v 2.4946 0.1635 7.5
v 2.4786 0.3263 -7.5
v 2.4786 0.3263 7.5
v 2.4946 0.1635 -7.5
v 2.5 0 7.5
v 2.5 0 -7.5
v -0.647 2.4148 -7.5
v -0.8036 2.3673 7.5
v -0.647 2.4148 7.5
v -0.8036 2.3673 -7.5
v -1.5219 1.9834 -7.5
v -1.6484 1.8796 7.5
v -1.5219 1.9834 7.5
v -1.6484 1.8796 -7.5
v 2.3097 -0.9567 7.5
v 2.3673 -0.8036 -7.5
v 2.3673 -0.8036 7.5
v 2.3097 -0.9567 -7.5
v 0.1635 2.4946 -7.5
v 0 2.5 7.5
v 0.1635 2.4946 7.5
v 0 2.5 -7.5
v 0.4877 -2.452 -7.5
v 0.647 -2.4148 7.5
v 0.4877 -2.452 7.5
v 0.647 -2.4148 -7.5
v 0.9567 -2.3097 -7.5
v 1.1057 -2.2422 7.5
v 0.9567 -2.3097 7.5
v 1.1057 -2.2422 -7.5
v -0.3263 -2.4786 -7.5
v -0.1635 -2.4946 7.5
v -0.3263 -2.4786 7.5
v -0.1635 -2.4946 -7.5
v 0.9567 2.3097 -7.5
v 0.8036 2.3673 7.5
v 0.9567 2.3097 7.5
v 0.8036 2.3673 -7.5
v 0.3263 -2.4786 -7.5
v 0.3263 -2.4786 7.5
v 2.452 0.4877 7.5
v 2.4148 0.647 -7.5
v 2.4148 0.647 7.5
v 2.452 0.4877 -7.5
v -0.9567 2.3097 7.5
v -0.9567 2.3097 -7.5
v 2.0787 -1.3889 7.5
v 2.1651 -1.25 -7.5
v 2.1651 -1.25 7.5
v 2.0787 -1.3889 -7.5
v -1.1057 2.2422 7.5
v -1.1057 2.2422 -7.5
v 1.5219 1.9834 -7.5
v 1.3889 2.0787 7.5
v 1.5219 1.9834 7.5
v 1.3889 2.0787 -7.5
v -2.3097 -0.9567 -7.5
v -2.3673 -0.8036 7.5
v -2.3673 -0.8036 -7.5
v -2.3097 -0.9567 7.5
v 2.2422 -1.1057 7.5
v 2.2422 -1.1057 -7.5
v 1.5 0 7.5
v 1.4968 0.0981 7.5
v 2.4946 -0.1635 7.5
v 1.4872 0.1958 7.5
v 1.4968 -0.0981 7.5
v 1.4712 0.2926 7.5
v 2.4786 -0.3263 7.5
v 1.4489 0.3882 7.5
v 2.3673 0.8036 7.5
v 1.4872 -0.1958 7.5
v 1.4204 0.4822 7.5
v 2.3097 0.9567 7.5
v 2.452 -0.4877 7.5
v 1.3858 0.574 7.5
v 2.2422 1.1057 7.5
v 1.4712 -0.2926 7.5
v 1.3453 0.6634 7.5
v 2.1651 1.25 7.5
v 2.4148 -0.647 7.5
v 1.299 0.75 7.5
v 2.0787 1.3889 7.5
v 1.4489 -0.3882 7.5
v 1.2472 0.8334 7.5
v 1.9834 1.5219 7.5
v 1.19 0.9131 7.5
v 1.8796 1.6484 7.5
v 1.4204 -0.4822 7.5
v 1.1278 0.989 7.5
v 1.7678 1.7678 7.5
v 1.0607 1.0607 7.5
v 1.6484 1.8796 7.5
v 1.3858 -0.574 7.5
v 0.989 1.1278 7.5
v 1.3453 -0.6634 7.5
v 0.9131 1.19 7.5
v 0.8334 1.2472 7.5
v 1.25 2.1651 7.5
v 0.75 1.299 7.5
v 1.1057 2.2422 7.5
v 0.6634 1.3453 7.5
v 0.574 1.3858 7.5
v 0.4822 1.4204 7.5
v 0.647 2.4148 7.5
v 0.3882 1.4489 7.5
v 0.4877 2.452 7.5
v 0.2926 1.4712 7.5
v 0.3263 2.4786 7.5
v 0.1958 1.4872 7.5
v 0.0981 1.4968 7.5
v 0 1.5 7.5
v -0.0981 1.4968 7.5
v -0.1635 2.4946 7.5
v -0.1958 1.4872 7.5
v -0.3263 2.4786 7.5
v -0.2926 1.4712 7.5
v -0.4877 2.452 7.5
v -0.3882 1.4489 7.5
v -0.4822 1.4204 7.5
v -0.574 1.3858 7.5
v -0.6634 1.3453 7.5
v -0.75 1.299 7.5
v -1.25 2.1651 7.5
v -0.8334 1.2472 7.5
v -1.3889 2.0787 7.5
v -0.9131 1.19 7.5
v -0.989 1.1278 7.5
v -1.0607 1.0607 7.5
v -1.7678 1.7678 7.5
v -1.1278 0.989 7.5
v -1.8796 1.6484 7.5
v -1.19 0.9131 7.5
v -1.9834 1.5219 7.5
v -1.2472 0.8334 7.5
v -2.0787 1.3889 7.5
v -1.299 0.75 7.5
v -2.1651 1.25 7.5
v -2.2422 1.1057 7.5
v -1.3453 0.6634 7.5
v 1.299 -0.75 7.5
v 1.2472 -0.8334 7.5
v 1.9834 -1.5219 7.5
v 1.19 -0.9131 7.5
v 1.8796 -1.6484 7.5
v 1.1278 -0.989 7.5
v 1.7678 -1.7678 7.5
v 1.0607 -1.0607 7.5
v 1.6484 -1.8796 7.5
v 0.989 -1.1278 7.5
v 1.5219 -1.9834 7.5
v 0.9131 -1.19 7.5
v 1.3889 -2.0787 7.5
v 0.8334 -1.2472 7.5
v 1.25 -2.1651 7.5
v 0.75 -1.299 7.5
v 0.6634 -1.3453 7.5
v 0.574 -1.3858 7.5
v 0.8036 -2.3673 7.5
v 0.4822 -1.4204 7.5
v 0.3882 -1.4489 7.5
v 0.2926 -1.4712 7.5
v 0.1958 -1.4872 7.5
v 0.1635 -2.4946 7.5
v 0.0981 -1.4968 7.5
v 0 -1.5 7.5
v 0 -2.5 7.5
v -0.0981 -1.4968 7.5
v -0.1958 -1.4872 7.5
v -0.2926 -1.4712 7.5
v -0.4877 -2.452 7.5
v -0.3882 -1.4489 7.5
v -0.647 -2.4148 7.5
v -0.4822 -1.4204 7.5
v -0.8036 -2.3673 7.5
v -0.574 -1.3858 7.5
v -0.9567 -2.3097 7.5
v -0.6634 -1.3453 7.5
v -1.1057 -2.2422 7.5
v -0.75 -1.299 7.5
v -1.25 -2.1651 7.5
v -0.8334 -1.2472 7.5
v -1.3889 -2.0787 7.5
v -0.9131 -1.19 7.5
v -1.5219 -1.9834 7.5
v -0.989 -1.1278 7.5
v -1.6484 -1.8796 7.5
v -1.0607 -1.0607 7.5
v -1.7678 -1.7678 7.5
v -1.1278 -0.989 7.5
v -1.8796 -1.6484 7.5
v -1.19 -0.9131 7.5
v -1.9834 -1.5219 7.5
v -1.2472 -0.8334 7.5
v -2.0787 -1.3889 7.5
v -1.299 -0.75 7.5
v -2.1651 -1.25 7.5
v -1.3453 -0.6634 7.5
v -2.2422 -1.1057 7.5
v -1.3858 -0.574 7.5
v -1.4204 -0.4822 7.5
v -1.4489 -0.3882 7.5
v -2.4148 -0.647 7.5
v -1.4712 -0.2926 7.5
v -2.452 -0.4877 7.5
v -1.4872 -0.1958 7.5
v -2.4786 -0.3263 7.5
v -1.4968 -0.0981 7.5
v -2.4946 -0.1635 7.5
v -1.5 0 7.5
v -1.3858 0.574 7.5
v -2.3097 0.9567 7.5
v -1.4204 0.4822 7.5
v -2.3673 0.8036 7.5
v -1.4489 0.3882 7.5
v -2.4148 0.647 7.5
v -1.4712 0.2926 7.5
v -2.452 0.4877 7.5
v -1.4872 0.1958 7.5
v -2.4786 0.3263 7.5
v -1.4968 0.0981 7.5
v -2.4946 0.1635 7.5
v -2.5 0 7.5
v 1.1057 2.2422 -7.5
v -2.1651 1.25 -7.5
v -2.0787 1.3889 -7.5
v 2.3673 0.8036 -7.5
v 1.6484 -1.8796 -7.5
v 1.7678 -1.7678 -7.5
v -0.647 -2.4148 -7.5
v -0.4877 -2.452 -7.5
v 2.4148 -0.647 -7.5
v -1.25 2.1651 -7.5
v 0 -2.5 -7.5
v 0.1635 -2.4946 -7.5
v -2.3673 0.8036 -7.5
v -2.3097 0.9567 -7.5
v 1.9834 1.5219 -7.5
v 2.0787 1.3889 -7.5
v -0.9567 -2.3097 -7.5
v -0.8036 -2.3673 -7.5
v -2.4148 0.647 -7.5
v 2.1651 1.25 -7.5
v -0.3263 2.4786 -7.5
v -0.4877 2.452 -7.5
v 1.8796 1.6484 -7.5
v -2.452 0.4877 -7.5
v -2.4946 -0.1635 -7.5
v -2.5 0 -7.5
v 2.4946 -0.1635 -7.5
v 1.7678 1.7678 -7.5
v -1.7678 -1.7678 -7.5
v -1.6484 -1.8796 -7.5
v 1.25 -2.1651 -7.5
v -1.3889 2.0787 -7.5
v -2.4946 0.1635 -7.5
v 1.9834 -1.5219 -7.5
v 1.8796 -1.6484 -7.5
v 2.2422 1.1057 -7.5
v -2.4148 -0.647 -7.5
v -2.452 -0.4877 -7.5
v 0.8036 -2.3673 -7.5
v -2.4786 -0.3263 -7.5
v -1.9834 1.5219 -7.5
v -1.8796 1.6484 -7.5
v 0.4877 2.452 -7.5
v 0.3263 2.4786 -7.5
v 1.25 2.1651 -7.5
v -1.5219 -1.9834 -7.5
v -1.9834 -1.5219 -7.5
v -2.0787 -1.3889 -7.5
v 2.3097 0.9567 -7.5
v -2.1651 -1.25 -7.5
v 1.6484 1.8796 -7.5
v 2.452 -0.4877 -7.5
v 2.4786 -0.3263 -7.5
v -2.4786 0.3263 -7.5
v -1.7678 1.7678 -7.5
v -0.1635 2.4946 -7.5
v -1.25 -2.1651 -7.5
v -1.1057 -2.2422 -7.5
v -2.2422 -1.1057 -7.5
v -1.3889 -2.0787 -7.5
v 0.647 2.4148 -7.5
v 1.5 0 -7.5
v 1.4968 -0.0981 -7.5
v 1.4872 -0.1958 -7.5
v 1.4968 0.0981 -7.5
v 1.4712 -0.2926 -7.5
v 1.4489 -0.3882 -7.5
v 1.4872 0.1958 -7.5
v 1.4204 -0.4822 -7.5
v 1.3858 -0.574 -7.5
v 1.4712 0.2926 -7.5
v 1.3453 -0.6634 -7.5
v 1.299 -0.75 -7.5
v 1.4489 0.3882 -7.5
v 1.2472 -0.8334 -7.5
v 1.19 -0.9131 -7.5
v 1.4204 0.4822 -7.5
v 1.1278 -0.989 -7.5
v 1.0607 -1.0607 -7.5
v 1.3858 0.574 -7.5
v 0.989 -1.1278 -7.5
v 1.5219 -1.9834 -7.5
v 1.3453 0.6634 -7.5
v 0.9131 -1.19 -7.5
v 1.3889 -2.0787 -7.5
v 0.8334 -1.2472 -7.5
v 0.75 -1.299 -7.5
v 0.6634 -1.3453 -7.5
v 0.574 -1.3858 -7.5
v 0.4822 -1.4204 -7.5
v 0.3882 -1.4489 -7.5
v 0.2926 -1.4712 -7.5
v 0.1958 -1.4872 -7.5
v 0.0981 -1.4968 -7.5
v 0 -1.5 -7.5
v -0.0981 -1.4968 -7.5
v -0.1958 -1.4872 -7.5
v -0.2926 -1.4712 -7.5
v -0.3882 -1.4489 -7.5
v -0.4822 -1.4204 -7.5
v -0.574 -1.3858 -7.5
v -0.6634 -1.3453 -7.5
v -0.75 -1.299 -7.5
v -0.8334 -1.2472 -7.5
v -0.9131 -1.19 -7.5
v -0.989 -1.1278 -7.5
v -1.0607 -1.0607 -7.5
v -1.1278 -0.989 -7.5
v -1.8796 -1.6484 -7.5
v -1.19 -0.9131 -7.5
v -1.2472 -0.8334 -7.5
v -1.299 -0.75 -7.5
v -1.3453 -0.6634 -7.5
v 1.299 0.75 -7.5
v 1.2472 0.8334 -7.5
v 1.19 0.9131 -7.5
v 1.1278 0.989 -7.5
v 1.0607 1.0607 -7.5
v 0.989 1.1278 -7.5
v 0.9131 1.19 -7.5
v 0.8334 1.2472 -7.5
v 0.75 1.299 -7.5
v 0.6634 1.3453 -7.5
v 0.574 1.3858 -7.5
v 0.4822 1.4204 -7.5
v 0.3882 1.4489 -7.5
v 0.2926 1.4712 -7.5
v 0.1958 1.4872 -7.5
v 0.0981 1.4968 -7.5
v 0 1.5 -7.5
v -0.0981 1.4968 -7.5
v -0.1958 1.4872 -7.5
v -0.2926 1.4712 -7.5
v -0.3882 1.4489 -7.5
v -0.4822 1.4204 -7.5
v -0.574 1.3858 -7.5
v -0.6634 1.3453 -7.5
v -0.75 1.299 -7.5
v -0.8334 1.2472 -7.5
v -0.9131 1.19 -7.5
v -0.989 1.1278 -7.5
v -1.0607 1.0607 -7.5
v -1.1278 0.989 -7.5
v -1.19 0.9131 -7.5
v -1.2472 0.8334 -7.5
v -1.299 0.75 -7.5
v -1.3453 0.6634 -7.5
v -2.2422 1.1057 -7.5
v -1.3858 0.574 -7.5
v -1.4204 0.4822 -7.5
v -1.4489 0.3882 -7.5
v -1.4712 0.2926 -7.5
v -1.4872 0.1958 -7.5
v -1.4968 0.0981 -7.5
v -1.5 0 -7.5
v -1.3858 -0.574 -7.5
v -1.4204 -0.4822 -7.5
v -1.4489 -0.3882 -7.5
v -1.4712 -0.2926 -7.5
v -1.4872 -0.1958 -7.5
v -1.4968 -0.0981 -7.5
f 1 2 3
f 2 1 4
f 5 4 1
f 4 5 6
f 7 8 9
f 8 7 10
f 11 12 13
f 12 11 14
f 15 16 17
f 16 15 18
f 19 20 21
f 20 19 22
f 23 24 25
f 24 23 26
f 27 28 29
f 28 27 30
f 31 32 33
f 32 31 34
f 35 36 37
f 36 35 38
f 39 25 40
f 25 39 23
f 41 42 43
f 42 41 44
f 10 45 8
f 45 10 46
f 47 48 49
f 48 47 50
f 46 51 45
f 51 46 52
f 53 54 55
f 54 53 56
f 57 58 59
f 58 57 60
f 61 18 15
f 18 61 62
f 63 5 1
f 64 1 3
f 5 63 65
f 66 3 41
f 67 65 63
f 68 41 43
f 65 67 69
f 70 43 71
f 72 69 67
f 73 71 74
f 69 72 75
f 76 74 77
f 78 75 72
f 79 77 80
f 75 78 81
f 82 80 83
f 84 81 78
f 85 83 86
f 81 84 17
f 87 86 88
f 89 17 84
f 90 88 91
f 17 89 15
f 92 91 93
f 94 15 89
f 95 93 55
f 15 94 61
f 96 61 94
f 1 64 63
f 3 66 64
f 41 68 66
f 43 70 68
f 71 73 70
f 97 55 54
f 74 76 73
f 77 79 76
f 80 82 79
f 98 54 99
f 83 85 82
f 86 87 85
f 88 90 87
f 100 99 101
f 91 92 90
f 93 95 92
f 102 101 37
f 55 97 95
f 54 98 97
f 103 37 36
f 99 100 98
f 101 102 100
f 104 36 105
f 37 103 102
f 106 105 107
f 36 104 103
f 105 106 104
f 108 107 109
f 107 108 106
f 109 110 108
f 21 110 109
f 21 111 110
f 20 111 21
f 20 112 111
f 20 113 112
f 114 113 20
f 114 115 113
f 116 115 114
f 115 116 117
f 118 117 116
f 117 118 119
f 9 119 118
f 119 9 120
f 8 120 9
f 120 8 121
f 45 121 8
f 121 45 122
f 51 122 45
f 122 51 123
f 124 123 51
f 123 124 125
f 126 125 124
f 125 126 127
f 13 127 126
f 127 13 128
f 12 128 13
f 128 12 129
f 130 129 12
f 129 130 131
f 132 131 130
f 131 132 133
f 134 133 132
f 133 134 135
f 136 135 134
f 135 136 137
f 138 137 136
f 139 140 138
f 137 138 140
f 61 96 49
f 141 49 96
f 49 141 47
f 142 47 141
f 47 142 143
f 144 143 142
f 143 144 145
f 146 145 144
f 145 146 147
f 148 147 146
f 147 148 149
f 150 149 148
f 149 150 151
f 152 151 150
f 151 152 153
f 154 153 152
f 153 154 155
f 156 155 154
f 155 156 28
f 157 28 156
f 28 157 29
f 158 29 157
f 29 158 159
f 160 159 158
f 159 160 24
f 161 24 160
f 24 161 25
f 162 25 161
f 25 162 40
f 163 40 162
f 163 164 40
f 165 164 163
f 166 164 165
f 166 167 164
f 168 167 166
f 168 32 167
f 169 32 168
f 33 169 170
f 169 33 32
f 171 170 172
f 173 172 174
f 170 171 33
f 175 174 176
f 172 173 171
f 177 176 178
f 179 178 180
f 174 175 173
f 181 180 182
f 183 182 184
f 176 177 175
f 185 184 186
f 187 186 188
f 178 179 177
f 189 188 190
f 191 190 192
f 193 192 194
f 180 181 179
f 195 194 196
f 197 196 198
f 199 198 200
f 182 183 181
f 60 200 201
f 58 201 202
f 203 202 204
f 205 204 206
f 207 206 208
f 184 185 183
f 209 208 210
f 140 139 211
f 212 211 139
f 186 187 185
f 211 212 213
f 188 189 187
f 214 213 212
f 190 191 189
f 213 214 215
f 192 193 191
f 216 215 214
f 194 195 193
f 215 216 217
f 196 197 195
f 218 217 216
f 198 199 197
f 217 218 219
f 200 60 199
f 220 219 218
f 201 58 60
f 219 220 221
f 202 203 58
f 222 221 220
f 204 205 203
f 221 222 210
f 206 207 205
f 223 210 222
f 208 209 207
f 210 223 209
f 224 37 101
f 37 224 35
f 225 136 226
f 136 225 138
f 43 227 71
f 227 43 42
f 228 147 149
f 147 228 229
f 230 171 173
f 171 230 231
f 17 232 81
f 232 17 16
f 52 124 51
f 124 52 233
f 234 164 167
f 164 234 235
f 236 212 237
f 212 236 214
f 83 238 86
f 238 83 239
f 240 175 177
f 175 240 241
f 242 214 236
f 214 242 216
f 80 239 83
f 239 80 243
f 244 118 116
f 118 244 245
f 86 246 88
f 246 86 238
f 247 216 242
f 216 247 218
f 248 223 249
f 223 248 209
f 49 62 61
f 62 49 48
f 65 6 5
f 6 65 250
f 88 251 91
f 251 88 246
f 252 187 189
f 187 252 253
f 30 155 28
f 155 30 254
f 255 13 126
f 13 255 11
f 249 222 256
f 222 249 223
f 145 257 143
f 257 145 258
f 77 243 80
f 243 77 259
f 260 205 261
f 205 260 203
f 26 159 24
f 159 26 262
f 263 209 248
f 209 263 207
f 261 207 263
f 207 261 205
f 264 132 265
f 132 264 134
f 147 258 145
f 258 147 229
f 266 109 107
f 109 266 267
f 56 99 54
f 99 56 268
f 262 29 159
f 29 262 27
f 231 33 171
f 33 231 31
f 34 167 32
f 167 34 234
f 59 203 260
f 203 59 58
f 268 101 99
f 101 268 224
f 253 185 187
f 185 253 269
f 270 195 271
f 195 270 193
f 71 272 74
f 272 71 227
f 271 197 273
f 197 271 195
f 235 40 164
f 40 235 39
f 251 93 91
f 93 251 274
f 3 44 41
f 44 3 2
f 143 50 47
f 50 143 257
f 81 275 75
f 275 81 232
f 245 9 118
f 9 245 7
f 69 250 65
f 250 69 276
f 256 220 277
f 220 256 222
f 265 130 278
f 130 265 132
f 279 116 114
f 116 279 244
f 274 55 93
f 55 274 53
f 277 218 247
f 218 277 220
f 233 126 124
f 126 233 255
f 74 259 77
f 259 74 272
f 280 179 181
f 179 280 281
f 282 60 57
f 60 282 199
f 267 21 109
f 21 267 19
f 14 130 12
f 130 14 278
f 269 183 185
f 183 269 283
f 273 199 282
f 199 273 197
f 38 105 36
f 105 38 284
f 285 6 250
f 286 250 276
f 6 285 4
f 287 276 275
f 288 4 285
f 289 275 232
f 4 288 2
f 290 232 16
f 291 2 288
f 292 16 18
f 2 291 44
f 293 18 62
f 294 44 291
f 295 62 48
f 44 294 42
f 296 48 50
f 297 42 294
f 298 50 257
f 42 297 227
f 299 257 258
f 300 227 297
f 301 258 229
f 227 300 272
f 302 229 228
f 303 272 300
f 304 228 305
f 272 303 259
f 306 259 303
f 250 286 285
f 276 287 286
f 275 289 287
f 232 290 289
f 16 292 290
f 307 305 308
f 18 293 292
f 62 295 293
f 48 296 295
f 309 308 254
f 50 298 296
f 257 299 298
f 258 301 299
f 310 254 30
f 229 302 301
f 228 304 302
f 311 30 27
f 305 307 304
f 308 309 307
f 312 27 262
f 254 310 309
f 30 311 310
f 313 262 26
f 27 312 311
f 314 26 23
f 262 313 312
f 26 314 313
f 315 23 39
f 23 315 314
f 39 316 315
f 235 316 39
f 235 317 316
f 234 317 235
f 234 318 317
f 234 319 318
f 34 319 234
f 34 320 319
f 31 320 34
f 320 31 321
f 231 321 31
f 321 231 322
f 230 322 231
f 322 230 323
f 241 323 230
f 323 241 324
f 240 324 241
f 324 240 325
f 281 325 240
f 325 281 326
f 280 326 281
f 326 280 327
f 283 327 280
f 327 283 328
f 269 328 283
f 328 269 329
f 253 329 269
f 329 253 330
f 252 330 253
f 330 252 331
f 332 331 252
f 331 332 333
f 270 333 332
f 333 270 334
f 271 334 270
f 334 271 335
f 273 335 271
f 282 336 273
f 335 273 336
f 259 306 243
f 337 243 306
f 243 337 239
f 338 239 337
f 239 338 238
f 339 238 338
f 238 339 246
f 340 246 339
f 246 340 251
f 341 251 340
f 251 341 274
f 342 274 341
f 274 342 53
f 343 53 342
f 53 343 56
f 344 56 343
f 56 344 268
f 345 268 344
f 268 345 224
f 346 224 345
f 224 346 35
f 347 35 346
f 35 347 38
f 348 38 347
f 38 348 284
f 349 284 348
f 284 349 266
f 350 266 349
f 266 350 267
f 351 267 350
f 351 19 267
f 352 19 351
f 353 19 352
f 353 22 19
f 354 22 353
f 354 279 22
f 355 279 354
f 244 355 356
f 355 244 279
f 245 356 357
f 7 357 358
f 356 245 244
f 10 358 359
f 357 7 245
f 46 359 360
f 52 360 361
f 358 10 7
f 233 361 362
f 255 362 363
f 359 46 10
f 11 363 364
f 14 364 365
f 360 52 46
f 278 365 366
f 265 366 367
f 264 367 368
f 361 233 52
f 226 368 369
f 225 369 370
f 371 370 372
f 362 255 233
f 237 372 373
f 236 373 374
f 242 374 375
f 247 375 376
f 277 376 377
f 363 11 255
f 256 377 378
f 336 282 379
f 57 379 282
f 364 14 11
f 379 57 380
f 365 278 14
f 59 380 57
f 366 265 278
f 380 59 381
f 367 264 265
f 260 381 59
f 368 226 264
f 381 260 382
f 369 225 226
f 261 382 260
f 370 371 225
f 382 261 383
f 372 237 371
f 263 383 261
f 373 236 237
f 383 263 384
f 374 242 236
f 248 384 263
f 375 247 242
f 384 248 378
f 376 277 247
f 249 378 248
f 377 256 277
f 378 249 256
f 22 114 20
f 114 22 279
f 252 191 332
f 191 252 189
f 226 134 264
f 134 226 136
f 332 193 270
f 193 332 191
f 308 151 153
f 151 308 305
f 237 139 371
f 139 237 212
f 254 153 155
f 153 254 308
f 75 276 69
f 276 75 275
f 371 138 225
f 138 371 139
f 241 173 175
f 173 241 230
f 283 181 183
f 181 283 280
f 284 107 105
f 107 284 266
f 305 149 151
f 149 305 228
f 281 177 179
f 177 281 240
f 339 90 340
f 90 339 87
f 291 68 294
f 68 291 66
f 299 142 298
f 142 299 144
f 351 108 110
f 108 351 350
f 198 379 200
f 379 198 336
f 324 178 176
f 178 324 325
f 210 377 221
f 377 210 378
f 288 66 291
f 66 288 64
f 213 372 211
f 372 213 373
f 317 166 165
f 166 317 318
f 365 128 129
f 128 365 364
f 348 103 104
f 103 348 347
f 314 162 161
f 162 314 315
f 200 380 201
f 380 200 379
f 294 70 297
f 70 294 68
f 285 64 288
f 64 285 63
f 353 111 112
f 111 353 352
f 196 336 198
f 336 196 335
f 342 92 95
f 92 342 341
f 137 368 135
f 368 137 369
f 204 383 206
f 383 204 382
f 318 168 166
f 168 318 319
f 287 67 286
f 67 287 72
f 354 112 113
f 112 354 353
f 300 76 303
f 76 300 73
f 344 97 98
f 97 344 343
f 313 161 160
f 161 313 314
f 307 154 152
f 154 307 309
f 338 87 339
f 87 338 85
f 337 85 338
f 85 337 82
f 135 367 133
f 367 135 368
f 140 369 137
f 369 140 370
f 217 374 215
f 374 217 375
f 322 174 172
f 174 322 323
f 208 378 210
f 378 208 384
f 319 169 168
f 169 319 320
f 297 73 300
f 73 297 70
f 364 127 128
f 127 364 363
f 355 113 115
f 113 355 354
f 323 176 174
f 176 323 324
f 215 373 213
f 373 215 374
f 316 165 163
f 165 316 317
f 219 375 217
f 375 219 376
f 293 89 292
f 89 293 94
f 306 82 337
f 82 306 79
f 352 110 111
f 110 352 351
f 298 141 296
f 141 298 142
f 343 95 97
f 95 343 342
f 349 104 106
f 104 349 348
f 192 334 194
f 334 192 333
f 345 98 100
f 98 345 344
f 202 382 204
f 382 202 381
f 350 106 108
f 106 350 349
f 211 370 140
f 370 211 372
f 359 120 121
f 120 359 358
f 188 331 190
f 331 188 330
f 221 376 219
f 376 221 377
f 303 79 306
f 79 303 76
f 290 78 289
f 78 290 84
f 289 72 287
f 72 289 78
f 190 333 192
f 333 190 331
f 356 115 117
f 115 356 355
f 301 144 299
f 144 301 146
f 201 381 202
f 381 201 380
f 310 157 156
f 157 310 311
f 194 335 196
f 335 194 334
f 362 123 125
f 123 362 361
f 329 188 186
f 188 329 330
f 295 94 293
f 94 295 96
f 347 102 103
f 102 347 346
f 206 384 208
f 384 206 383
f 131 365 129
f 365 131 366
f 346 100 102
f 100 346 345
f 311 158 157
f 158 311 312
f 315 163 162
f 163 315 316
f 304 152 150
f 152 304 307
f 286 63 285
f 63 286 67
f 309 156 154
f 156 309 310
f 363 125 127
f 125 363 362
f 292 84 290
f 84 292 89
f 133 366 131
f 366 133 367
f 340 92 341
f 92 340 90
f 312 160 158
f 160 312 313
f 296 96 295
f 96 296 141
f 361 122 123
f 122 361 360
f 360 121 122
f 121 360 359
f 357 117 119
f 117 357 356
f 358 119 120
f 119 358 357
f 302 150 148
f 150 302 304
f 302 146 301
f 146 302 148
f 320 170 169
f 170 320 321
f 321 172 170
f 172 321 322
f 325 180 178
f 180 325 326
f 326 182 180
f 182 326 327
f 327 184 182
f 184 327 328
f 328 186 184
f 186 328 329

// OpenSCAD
// Heatshrink sleeving (simple hollow tube segment) - single connected solid

// Parameters
length = 15;            //[8:30:1]  Tube length
center = 1;             //[0:1:1]   1=centered at origin, 0=sits on Z=0
forced_id = 0;          //[0:10:0.1] If >0, overrides nominal_id
nominal_id = 3;         //[1.5:6:0.1]
nominal_od = 5;         //[2.5:10:0.1]
id = 3;                 //[1.5:10:0.1] Inner diameter (used if forced_id==0)
od = 5;                 //[2.5:20:0.1] Outer diameter
eps_overlap = 1;        //[0.5:2:0.1] Extra cut length to ensure clean hollow

$fn = 96;

// Derived dimensions (ensure valid tube wall)
inner_d = (forced_id > 0) ? forced_id : id;
outer_d = od;

// Clamp to avoid empty/invalid geometry
min_wall = 0.4;
inner_d_clamped = min(inner_d, outer_d - 2*min_wall);
inner_d_final = max(0.01, inner_d_clamped);
outer_d_final = max(inner_d_final + 2*min_wall, outer_d);

z0 = (center == 1) ? 0 : (length/2);

module heatshrink_sleeving() {
  color([0.85, 0.85, 0.8])
  translate([0, 0, z0])
    difference() {
      cylinder(d=outer_d_final, h=length, center=true);
      cylinder(d=inner_d_final, h=length + 2*eps_overlap, center=true);
    }
}

heatshrink_sleeving();
